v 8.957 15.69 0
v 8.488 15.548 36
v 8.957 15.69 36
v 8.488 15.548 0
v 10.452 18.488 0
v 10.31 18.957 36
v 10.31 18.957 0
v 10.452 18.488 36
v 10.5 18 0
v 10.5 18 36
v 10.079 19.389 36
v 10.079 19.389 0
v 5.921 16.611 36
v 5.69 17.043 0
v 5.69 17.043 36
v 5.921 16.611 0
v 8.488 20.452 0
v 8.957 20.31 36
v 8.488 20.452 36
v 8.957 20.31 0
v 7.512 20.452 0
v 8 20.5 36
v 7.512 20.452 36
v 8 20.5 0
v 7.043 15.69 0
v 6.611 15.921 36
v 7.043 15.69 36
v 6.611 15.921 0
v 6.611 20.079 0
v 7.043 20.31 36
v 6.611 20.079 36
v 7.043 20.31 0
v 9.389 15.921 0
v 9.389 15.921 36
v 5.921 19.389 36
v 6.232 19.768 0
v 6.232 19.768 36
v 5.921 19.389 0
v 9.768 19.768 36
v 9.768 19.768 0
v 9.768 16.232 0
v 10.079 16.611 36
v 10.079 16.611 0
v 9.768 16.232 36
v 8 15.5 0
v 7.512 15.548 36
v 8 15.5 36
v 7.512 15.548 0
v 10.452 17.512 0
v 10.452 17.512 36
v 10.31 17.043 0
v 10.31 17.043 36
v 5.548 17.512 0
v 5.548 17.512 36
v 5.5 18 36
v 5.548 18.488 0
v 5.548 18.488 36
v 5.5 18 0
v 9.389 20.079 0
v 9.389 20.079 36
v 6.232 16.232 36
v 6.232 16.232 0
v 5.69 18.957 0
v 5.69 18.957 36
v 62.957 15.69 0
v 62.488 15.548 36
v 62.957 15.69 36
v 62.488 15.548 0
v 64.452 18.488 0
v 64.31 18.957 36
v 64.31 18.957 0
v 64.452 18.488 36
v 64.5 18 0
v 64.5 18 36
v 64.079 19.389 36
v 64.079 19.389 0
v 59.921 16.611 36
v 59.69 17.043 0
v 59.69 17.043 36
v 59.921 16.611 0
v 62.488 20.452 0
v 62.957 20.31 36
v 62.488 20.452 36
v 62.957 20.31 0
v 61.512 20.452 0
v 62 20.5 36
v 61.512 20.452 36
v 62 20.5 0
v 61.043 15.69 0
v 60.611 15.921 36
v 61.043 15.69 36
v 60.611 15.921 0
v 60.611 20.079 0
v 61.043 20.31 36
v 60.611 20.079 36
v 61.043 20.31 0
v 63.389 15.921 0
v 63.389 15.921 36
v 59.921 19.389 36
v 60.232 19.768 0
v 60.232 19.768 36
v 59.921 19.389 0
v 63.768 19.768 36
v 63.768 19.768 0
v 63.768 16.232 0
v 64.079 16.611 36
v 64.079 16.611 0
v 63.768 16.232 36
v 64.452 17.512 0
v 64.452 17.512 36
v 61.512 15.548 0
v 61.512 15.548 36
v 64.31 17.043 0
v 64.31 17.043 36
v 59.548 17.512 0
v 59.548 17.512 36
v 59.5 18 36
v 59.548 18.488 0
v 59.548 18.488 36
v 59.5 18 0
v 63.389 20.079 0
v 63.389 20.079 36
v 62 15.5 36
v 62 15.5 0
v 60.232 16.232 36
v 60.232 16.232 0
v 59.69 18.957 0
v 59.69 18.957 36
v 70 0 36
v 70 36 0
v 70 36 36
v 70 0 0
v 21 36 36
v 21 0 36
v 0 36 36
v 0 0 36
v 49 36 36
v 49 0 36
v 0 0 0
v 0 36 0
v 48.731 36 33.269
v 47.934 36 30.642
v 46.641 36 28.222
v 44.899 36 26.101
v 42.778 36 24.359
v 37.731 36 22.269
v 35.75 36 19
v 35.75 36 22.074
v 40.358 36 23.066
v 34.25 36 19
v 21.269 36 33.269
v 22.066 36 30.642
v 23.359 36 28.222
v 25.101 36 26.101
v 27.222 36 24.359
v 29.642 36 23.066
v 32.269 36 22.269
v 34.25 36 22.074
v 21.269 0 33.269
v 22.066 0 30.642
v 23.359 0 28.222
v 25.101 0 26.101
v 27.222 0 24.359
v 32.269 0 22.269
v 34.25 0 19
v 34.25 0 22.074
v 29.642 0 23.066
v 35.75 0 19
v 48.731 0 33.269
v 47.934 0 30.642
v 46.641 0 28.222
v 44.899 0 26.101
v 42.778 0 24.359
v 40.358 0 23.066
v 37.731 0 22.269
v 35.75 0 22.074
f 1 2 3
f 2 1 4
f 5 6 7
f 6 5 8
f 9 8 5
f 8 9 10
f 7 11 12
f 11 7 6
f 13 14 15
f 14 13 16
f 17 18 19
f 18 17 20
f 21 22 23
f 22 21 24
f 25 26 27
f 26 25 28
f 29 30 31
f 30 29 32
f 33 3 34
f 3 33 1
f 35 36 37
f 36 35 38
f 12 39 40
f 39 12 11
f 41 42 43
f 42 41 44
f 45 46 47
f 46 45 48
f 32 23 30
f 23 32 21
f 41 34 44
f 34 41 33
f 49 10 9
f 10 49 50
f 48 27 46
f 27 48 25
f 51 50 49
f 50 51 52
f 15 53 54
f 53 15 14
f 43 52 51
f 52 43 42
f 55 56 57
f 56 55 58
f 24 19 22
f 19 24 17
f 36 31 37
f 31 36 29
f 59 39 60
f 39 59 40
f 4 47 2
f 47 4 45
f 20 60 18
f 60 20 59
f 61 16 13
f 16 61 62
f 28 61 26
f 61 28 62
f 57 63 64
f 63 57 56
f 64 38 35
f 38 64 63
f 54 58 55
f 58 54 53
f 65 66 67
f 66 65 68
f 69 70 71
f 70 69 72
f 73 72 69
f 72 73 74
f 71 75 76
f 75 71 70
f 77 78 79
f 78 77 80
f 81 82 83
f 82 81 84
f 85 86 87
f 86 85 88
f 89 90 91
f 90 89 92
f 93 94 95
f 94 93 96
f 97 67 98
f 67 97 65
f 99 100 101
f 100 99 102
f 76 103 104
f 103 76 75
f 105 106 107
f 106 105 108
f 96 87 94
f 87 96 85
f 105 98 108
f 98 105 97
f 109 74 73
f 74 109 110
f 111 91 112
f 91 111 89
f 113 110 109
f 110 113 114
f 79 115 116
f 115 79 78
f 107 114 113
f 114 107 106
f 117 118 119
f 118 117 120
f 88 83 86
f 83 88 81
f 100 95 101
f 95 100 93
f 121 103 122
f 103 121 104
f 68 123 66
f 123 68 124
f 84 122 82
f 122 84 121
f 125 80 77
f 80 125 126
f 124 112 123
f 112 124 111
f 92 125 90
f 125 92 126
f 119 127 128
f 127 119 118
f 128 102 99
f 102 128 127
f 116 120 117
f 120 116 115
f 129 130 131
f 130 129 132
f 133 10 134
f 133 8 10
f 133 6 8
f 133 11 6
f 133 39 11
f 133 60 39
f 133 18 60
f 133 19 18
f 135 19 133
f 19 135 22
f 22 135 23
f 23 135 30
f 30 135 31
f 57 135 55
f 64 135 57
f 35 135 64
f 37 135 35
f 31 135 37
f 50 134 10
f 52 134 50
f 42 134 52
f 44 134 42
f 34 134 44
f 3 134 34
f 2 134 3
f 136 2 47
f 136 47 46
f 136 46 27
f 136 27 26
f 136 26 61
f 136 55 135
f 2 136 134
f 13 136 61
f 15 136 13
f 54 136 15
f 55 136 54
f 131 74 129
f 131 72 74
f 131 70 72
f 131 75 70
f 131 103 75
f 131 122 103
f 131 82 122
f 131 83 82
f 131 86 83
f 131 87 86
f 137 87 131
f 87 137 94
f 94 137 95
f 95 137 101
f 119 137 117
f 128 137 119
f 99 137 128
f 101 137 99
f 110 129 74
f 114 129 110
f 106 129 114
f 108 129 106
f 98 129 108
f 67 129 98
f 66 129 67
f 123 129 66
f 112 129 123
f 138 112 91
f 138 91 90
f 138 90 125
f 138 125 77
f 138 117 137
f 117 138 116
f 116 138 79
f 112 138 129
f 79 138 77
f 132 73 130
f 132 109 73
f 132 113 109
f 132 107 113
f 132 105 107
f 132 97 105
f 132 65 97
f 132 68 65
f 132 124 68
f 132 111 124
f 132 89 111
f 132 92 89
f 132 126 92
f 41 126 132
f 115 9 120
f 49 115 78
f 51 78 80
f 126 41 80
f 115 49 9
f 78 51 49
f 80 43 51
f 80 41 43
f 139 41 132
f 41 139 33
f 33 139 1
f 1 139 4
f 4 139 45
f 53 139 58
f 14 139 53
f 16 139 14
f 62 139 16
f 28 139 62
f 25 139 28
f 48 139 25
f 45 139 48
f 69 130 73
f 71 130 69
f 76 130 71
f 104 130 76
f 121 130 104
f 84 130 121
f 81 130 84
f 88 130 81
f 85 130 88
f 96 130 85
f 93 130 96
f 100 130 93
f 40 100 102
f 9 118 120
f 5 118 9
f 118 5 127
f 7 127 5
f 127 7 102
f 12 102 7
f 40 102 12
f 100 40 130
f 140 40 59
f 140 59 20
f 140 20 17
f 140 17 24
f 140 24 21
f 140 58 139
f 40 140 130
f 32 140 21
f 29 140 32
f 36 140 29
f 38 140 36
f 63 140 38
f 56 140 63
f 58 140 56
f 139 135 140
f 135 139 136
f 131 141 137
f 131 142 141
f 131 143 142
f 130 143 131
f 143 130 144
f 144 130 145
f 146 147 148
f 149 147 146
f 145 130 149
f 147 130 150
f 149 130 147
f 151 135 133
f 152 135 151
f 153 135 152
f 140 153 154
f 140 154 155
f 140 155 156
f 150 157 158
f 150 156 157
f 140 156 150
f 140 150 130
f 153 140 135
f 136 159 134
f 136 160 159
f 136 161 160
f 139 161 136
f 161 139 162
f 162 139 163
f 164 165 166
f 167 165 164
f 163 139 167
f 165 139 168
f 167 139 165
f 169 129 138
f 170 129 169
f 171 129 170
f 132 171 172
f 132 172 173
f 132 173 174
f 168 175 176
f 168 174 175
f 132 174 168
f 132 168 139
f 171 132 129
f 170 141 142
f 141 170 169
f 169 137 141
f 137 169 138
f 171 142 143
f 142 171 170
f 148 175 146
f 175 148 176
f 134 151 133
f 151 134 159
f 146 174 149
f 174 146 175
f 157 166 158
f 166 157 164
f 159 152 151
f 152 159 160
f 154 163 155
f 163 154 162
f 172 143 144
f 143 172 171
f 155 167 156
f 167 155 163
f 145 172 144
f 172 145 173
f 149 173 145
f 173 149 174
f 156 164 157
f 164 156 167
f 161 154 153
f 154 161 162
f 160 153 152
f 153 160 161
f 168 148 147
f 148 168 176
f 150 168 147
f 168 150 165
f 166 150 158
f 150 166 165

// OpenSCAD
$fn = 32;

// ----------------------------------------------------------------------
// Saddle clamp: split shaft clamp
// ----------------------------------------------------------------------

// --- parameters (mm) ---
blk_l = 70;               // block length, X
blk_w = 36;               // block width, Y
blk_h = 36;               // block height
clamp_r = 14;             // shaft groove radius
hole_r = 2.5;             // bolt hole radius
hole_m = 8;               // bolt hole margin from the ends
saw_w = 1.5;              // saw kerf width

saw_depth = clamp_r + 3;  // saw kerf depth

difference() {
  cube([blk_l, blk_w, blk_h]);
  translate([blk_l / 2, -1, blk_h])
    rotate([-90, 0, 0])
      cylinder(h = blk_w + 2, r = clamp_r);
  for (sx = [0, 1])
    translate([sx ? blk_l - hole_m : hole_m, blk_w / 2, -1])
      cylinder(r = hole_r, h = blk_h + 2);
  translate([blk_l / 2 - saw_w / 2, -1, blk_h - saw_depth])
    cube([saw_w, blk_w + 2, saw_depth + 1]);
}
